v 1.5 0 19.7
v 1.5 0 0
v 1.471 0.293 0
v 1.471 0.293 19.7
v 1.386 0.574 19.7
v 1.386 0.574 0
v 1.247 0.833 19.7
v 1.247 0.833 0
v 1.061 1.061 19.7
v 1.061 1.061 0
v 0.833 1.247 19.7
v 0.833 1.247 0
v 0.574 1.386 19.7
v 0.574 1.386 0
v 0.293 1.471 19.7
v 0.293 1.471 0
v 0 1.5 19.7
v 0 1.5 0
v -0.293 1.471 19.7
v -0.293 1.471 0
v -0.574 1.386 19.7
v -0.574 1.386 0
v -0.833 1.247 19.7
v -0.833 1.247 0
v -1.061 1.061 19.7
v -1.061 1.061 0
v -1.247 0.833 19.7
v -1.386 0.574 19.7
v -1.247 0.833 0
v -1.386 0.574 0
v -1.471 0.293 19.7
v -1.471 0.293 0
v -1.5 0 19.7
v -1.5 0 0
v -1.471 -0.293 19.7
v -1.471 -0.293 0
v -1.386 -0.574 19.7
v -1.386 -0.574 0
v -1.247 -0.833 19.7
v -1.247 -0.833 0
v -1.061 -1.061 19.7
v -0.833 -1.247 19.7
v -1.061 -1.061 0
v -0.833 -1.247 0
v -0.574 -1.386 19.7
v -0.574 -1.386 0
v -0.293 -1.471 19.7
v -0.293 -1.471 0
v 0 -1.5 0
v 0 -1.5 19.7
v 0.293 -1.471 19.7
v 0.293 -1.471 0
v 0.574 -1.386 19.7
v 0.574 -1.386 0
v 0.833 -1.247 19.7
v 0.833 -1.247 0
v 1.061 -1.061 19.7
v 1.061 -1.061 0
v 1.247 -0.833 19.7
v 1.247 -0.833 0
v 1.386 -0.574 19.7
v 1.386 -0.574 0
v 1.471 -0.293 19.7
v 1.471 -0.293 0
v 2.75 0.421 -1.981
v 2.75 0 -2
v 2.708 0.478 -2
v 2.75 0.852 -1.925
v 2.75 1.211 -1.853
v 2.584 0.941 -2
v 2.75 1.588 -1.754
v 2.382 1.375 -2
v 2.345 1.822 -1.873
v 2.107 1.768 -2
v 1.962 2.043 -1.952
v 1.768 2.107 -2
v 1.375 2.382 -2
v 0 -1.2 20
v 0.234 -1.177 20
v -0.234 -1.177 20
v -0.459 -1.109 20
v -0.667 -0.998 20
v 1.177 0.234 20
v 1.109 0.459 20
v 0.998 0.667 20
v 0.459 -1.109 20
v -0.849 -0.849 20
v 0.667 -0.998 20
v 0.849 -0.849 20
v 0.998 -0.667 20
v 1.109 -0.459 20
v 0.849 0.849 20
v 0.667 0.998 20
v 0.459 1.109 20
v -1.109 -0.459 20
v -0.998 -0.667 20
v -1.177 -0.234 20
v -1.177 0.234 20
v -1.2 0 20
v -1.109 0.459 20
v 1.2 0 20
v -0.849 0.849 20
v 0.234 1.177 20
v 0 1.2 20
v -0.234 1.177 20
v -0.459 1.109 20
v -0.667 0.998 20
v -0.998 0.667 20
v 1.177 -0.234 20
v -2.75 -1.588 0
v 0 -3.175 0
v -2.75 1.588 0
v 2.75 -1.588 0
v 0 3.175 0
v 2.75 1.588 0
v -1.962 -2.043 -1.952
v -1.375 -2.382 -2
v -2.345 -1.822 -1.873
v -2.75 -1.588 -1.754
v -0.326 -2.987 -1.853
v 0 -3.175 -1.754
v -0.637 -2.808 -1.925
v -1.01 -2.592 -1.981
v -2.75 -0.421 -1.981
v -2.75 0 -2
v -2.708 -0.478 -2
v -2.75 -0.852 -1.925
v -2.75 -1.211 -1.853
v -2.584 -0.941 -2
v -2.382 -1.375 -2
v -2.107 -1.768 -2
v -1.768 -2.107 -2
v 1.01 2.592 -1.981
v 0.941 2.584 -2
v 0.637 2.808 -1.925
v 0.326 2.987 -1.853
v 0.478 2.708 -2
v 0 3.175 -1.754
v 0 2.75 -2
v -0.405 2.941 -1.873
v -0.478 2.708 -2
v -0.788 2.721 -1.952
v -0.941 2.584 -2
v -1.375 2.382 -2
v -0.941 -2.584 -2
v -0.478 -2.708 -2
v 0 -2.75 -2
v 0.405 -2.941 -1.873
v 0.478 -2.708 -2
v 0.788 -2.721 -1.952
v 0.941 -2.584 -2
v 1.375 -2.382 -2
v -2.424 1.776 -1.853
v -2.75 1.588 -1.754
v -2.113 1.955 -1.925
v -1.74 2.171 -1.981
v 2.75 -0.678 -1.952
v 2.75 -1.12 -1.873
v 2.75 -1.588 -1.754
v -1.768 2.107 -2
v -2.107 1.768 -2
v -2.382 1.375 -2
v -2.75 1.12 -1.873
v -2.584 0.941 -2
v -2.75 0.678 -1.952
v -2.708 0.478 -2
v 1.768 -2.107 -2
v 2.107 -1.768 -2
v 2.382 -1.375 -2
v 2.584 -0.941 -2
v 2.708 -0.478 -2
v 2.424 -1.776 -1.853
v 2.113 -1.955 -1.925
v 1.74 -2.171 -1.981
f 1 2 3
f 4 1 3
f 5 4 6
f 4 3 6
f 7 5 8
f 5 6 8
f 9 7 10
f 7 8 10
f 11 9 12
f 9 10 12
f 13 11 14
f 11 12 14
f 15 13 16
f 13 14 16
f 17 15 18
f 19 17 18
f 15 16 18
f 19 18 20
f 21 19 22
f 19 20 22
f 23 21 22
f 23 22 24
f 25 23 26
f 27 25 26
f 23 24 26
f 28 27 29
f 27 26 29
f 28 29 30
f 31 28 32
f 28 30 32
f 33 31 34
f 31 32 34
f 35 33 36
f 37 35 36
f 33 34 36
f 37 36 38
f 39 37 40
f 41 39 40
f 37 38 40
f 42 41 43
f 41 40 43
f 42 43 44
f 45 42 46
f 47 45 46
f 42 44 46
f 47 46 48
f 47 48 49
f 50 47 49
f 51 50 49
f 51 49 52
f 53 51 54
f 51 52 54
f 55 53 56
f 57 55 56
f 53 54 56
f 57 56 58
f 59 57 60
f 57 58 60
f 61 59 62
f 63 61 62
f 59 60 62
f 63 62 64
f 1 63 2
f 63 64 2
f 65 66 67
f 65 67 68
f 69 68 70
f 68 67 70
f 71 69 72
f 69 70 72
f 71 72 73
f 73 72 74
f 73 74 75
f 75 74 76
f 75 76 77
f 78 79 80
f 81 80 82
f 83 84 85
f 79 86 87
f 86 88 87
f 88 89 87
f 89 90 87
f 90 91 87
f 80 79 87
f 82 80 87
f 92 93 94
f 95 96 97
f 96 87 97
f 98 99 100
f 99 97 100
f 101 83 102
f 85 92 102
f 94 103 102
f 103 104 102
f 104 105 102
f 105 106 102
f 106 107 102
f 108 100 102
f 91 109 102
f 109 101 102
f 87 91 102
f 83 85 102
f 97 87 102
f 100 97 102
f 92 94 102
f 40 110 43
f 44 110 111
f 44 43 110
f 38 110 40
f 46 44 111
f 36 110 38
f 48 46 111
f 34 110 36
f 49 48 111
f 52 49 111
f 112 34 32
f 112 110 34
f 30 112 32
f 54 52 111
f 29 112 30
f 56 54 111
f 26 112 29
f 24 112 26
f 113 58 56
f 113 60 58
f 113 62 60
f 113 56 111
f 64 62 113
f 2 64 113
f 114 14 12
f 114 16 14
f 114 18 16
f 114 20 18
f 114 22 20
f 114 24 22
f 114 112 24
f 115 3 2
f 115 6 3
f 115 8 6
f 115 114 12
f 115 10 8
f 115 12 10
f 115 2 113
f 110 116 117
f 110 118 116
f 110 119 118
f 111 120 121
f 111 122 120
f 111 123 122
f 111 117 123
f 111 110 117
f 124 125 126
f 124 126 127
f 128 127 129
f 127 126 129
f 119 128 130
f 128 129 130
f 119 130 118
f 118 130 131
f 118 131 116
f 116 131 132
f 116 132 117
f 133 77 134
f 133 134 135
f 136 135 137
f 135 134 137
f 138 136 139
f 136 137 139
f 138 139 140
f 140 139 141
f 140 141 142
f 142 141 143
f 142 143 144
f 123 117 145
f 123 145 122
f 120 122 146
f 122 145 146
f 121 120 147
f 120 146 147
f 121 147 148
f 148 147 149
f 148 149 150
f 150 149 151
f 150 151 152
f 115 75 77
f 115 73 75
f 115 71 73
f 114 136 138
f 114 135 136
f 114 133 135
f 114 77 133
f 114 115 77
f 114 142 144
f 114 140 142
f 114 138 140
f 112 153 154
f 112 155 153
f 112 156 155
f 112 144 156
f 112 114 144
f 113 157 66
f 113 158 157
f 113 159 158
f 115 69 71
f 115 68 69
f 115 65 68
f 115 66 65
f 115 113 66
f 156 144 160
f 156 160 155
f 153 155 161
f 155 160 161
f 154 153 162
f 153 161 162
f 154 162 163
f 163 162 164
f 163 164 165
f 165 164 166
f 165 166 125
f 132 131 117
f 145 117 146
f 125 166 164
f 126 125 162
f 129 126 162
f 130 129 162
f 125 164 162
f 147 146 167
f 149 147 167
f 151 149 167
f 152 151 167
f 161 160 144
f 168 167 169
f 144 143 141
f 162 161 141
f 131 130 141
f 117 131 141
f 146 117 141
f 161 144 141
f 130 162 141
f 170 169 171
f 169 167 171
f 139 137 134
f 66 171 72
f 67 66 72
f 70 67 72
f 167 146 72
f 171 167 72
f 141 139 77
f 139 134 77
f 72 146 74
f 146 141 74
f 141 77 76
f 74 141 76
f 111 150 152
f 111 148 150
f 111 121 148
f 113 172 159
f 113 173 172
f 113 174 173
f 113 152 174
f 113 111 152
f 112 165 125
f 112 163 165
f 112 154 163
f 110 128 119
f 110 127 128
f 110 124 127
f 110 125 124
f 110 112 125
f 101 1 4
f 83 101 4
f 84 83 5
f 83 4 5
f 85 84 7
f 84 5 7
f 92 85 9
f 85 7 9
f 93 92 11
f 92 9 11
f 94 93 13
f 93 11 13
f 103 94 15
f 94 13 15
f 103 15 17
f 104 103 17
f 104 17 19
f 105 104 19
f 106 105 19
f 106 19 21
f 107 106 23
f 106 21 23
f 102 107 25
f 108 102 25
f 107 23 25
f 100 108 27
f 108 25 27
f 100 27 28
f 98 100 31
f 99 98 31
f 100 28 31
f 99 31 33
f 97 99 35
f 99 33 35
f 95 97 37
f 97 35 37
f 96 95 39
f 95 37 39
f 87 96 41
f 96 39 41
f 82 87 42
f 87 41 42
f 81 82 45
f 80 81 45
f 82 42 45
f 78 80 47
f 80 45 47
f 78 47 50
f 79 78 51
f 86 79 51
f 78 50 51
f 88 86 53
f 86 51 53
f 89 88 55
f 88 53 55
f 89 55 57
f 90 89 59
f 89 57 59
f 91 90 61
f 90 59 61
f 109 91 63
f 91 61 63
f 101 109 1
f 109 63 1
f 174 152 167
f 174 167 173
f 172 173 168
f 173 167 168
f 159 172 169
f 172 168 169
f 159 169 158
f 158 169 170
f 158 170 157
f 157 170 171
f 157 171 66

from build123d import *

# Parameters (mm, degrees)
ESQUISSE1_W        = 1.5
ESQUISSE1_H        = 20
CHANFREIN1_SIZE    = 0.3
BOSS_EXTRU_1_DEPTH = 2


with BuildPart() as part:
    # Esquisse1 → Base-R_volution (revolve)
    with BuildSketch(Plane(origin=(0, 0, 0), x_dir=(1, 0, 0), z_dir=(0, 1, 0))):
        with Locations((0.75, -10)):
            Rectangle(ESQUISSE1_W, ESQUISSE1_H)
    revolve(axis=Axis((0, 0, 0), (0, 0, 1)))

    # Chanfrein1
    chanfrein1_edges = [part.edges().sort_by_distance(p)[0] for p in [
        (-1.5, 0, 20),
    ]]
    chamfer(chanfrein1_edges, length=CHANFREIN1_SIZE)

    # Esquisse6 → Boss.-Extru.1 (add)
    with BuildSketch(Plane.XY):
        Polygon((2.75, -1.58771324), (2.75, 1.58771324), (0, 3.175426481), (-2.75, 1.58771324), (-2.75, -1.58771324), (0, -3.175426481), align=None)
    extrude(amount=-BOSS_EXTRU_1_DEPTH)

    # Esquisse7 → Enl_vement de mati_re-R_volution1 (revolve, cut)
    with BuildSketch(Plane(origin=(0, 0, 0), x_dir=(1, 0, 0), z_dir=(0, 1, 0)), mode=Mode.PRIVATE) as enl_vement_de_mati_re_r_volution1_sk:
        Polygon((-2.75, 2), (-6.214101615, 2), (-6.214101615, 0), align=None)
    revolve(enl_vement_de_mati_re_r_volution1_sk.sketch.rotate(Axis((0, 0, -6.239446496), (0, 0, 1)), 180), axis=Axis((0, 0, -6.239446496), (0, 0, 1)), mode=Mode.SUBTRACT)  # turned: the seam where the file's is


solid = part.part
